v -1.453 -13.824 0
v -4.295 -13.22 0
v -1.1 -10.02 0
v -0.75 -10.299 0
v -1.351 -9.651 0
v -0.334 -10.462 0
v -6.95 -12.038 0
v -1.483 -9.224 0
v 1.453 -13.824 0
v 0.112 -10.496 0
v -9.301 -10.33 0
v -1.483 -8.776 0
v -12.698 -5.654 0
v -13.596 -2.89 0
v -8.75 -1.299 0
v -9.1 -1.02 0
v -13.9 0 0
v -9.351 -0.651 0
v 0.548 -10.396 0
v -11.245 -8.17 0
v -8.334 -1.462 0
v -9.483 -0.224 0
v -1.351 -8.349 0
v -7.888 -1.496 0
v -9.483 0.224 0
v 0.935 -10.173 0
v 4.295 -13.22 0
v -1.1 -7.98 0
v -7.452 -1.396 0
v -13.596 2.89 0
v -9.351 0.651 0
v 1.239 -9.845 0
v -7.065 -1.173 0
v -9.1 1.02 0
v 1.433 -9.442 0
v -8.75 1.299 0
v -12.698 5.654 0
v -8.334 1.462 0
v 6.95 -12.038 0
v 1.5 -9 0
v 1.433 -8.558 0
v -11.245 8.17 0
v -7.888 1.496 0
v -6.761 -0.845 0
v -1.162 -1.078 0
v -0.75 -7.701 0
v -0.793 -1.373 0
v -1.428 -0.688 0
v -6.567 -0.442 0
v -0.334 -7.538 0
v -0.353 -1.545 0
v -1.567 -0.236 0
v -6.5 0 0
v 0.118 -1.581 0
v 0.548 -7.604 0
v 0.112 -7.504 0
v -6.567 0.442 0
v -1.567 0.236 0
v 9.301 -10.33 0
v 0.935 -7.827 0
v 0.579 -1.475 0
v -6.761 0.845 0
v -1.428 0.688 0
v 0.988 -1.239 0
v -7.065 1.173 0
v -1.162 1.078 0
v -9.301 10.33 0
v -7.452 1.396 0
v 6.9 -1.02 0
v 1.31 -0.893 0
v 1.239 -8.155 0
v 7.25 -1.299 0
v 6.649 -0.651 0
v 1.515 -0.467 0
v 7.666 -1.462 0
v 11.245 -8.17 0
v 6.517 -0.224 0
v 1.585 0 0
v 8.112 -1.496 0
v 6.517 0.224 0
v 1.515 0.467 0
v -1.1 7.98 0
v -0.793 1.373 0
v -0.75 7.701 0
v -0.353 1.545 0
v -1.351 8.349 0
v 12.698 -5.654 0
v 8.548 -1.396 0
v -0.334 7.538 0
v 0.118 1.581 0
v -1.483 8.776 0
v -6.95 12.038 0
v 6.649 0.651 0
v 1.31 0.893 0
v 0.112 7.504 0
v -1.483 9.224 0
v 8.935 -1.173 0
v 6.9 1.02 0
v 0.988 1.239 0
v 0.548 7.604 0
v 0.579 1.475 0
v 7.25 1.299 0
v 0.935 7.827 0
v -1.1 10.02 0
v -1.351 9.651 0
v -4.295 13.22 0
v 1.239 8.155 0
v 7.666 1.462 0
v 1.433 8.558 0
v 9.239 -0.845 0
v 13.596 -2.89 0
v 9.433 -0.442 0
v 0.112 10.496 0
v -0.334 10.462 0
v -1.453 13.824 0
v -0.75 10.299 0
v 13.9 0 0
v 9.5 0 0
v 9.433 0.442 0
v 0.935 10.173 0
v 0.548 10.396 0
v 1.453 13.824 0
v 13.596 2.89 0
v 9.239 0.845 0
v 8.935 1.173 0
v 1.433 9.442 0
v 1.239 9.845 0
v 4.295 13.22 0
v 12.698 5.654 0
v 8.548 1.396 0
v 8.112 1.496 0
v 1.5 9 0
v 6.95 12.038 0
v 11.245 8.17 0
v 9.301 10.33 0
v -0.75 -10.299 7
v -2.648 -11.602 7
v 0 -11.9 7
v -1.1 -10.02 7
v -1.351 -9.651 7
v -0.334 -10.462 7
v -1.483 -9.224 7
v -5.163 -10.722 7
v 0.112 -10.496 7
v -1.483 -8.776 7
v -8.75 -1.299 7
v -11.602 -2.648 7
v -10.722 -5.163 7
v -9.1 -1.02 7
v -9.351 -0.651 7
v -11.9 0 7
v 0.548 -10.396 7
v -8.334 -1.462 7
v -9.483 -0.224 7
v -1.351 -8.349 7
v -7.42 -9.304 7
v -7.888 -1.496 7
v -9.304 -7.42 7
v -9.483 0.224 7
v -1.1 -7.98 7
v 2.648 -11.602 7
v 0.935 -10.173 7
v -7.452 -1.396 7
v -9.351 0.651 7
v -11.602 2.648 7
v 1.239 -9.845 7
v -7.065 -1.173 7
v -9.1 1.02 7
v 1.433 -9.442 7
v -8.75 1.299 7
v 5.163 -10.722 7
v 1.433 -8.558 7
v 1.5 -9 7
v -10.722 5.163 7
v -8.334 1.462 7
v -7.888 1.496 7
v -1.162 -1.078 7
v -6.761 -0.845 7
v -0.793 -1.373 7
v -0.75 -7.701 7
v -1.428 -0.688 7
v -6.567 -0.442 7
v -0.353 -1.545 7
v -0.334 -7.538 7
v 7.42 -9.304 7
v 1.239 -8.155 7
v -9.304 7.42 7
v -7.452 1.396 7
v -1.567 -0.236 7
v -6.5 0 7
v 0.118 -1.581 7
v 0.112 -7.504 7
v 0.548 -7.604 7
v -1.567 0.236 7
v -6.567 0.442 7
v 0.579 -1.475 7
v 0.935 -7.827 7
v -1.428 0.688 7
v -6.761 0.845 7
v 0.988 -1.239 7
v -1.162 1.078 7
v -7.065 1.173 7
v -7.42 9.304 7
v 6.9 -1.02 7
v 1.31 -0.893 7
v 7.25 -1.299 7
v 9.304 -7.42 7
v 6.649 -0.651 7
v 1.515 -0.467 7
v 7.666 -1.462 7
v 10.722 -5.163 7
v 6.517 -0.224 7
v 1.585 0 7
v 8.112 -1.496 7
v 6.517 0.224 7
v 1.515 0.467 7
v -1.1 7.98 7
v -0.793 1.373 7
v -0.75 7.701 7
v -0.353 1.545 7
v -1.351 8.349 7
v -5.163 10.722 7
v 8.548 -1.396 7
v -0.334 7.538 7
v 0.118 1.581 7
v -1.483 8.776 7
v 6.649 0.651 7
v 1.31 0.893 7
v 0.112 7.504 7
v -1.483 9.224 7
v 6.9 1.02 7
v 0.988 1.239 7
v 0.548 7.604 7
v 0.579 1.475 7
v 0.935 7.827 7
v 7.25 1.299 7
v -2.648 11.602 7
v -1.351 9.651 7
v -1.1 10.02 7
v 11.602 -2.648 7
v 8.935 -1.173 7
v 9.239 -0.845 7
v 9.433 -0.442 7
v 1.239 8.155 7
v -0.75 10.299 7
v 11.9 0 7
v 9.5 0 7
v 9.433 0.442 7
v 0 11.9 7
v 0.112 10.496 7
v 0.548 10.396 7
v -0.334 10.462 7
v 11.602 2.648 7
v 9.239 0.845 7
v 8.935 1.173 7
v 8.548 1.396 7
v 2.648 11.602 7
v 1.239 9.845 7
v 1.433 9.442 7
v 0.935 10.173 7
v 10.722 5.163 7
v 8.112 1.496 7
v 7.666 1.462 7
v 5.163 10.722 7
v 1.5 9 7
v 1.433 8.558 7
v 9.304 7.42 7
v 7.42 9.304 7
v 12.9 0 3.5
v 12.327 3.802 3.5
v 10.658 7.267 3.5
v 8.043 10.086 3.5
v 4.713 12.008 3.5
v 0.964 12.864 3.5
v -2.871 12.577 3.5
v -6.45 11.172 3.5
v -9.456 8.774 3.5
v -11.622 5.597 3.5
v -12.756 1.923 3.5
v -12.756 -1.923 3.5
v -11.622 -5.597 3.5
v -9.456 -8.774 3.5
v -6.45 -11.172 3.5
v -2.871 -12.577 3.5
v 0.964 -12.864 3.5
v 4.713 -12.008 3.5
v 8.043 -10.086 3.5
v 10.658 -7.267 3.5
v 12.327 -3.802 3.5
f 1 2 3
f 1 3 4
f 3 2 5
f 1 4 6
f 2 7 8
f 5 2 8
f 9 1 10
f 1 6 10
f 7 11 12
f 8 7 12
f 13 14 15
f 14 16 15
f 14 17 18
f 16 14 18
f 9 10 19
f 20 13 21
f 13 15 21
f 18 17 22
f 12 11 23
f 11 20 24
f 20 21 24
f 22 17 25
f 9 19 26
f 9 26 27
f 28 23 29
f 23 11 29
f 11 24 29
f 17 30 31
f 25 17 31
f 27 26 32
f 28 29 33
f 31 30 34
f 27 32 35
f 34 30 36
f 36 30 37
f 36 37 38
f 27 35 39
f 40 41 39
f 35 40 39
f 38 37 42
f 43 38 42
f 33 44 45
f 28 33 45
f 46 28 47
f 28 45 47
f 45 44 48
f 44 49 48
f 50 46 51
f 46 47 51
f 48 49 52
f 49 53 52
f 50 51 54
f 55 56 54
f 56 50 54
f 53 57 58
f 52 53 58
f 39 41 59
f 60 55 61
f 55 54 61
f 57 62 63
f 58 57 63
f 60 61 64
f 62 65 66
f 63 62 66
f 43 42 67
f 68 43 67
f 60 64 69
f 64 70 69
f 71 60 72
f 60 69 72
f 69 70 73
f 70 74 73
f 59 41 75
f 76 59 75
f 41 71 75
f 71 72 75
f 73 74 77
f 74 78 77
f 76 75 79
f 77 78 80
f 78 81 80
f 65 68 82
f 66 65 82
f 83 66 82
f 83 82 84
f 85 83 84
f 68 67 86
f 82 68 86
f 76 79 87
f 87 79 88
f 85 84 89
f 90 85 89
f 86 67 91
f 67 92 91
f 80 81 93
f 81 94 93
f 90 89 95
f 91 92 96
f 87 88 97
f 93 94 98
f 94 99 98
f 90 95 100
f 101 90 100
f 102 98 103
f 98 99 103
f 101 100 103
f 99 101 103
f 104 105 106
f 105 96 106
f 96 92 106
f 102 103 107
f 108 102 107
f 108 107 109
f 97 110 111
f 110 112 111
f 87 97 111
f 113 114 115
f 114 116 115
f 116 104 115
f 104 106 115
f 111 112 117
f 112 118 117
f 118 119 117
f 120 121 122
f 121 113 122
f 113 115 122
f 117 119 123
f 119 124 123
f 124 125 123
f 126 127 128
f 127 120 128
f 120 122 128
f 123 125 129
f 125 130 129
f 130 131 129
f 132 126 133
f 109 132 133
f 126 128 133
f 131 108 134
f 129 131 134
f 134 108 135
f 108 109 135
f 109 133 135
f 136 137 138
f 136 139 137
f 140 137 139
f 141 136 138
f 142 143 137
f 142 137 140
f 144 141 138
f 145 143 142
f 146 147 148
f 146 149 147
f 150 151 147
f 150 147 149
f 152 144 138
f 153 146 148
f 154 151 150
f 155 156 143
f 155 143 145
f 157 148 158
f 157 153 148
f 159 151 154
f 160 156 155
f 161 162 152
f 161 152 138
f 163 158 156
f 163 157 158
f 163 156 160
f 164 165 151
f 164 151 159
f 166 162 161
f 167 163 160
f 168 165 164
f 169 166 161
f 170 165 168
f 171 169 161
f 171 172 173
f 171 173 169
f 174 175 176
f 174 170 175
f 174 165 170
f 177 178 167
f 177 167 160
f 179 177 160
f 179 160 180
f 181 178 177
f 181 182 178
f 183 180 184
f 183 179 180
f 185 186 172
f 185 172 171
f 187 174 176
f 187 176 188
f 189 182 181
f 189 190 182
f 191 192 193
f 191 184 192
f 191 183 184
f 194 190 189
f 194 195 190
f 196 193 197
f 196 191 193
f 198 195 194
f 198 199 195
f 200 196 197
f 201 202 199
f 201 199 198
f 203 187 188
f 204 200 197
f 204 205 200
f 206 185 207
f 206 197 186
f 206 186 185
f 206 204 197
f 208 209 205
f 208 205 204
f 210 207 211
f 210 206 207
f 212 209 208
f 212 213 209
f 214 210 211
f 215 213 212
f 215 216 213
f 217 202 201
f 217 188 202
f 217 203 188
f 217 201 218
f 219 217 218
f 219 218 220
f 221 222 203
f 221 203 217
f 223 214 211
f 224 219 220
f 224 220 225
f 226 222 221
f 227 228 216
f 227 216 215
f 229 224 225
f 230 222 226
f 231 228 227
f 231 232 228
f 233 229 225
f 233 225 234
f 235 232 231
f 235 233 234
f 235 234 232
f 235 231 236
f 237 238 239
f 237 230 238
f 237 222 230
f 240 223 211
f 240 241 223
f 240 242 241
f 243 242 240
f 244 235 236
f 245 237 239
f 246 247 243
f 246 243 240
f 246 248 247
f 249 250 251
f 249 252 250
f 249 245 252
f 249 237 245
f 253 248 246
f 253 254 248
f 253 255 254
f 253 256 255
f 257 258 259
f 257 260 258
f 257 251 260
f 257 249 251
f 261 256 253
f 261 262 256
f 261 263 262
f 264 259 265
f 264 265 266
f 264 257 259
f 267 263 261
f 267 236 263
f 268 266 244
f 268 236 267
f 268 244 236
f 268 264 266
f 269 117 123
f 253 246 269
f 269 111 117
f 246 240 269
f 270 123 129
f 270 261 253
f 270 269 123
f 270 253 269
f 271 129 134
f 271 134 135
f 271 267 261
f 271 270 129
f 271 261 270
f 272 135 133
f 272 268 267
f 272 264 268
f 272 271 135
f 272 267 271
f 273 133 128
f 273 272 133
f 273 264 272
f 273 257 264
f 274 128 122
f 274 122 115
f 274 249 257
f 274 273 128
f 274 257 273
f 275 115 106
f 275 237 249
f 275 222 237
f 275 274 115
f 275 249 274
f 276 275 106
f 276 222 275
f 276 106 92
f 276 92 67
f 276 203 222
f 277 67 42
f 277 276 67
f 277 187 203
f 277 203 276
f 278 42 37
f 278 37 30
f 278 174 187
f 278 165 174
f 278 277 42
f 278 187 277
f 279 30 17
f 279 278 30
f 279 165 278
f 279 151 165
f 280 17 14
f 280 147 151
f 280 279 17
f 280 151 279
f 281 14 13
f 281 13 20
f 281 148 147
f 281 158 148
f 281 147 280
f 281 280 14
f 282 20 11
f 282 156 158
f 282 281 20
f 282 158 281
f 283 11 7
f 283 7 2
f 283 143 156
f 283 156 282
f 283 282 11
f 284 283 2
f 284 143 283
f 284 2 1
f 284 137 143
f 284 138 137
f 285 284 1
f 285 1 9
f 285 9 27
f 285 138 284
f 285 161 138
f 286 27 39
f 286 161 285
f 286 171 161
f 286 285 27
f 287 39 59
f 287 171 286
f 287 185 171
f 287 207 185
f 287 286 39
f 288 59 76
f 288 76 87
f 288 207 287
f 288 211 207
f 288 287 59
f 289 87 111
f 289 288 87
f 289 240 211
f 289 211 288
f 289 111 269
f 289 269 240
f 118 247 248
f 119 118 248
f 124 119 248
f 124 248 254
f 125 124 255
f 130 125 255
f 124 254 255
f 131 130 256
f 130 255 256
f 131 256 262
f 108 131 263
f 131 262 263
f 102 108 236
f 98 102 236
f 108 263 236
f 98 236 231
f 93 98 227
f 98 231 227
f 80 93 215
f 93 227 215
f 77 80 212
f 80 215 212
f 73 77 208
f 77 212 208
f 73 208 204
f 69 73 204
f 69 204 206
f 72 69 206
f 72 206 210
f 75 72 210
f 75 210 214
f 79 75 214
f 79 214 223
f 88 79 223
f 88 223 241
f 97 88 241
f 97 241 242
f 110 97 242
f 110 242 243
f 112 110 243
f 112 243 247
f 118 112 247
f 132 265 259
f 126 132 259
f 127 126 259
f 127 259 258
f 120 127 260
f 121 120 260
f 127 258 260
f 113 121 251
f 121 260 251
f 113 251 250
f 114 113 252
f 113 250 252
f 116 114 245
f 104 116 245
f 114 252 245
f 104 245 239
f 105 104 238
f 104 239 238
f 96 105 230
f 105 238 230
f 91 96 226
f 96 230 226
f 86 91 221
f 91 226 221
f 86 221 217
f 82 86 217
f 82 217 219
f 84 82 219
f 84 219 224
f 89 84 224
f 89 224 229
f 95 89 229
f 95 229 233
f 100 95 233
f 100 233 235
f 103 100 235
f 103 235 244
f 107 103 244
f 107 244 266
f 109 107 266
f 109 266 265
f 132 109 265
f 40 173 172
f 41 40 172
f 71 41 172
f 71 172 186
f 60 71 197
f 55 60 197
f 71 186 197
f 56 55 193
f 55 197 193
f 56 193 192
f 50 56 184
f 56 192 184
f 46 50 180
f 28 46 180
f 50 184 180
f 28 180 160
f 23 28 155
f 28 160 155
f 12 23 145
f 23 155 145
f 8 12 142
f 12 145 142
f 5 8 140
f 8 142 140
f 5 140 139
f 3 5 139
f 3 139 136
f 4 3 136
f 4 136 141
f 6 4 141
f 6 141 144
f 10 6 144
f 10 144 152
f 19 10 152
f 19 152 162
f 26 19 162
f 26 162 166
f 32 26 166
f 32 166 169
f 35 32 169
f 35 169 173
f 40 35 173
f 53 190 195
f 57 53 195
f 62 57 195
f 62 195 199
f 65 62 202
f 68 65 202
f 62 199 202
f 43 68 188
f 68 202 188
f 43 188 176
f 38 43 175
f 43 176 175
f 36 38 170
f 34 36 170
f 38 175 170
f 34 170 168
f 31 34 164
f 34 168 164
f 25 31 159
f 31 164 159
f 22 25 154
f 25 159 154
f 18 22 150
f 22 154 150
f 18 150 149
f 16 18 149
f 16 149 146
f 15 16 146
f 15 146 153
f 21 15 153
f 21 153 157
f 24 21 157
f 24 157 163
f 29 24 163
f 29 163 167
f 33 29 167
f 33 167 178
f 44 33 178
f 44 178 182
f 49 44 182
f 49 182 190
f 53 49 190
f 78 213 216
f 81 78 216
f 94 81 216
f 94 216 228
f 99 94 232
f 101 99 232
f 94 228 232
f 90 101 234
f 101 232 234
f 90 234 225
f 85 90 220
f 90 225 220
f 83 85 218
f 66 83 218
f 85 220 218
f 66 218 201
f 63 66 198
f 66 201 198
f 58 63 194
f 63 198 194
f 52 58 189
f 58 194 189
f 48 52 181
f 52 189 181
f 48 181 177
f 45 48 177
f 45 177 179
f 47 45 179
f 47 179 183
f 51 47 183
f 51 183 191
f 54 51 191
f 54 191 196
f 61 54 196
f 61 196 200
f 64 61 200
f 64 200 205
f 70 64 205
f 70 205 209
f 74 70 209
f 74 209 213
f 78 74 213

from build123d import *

# Parameters (mm, degrees)
SKETCH1_R           = 13.9
BOSS_EXTRUDE1_DEPTH = 7
CUT_EXTRUDE1_REACH  = 22.867
SKETCH2_R           = 1.585
CUT_EXTRUDE2_REACH  = 22.867
SKETCH3_R           = 1.5
CHAMFER1_SIZE       = 7
CHAMFER1_SIZE_2     = 2


with BuildPart() as part:
    # Sketch1 → Boss-Extrude1 (new body)
    with BuildSketch(Plane.XY):
        Circle(SKETCH1_R)
    extrude(amount=BOSS_EXTRUDE1_DEPTH)

    # Sketch2 → Cut-Extrude1 (cut, up to next)
    with BuildSketch(Plane.XY.offset(7), mode=Mode.PRIVATE) as cut_extrude1_sk1:
        Circle(SKETCH2_R)
    cut_extrude1_tool1 = extrude(cut_extrude1_sk1.sketch, amount=-CUT_EXTRUDE1_REACH, mode=Mode.PRIVATE) & part.part
    add(cut_extrude1_tool1.solids().sort_by_distance((0, 0, 7))[0], mode=Mode.SUBTRACT)

    # Sketch3 → Cut-Extrude2 (cut, up to next)
    with BuildSketch(Plane.XY.offset(7), mode=Mode.PRIVATE) as cut_extrude2_sk1:
        with Locations((-8, 0)):
            Circle(SKETCH3_R)
    cut_extrude2_tool1 = extrude(cut_extrude2_sk1.sketch, amount=-CUT_EXTRUDE2_REACH, mode=Mode.PRIVATE) & part.part
    # Sketch3 → Cut-Extrude2 (cut, up to next)
    with BuildSketch(Plane.XY.offset(7), mode=Mode.PRIVATE) as cut_extrude2_sk2:
        with Locations((8, 0)):
            Circle(SKETCH3_R)
    cut_extrude2_tool2 = extrude(cut_extrude2_sk2.sketch, amount=-CUT_EXTRUDE2_REACH, mode=Mode.PRIVATE) & part.part
    # Sketch3 → Cut-Extrude2 (cut, up to next)
    with BuildSketch(Plane.XY.offset(7), mode=Mode.PRIVATE) as cut_extrude2_sk3:
        with Locations((0, -9)):
            Circle(SKETCH3_R)
    cut_extrude2_tool3 = extrude(cut_extrude2_sk3.sketch, amount=-CUT_EXTRUDE2_REACH, mode=Mode.PRIVATE) & part.part
    # Sketch3 → Cut-Extrude2 (cut, up to next)
    with BuildSketch(Plane.XY.offset(7), mode=Mode.PRIVATE) as cut_extrude2_sk4:
        with Locations((0, 9)):
            Circle(SKETCH3_R)
    cut_extrude2_tool4 = extrude(cut_extrude2_sk4.sketch, amount=-CUT_EXTRUDE2_REACH, mode=Mode.PRIVATE) & part.part
    add(cut_extrude2_tool1.solids().sort_by_distance((-8, 0, 7))[0], mode=Mode.SUBTRACT)
    add(cut_extrude2_tool2.solids().sort_by_distance((8, 0, 7))[0], mode=Mode.SUBTRACT)
    add(cut_extrude2_tool3.solids().sort_by_distance((0, -9, 7))[0], mode=Mode.SUBTRACT)
    add(cut_extrude2_tool4.solids().sort_by_distance((0, 9, 7))[0], mode=Mode.SUBTRACT)

    # Chamfer1
    # the kernel refuses this chamfer: 7, 2 mm, written as the material it takes off along each edge
    with BuildSketch(Plane(origin=(0, 0, 7), x_dir=(1, 0, 0), z_dir=(0, -1, 0))) as chamfer1_piece_1:
        Polygon((13.9, -CHAMFER1_SIZE), (13.9 - CHAMFER1_SIZE_2, 0), (13.9, 0), align=None)
    revolve(axis=Axis((0, 0, 7), (0, 0, 1)), mode=Mode.SUBTRACT)


solid = part.part
